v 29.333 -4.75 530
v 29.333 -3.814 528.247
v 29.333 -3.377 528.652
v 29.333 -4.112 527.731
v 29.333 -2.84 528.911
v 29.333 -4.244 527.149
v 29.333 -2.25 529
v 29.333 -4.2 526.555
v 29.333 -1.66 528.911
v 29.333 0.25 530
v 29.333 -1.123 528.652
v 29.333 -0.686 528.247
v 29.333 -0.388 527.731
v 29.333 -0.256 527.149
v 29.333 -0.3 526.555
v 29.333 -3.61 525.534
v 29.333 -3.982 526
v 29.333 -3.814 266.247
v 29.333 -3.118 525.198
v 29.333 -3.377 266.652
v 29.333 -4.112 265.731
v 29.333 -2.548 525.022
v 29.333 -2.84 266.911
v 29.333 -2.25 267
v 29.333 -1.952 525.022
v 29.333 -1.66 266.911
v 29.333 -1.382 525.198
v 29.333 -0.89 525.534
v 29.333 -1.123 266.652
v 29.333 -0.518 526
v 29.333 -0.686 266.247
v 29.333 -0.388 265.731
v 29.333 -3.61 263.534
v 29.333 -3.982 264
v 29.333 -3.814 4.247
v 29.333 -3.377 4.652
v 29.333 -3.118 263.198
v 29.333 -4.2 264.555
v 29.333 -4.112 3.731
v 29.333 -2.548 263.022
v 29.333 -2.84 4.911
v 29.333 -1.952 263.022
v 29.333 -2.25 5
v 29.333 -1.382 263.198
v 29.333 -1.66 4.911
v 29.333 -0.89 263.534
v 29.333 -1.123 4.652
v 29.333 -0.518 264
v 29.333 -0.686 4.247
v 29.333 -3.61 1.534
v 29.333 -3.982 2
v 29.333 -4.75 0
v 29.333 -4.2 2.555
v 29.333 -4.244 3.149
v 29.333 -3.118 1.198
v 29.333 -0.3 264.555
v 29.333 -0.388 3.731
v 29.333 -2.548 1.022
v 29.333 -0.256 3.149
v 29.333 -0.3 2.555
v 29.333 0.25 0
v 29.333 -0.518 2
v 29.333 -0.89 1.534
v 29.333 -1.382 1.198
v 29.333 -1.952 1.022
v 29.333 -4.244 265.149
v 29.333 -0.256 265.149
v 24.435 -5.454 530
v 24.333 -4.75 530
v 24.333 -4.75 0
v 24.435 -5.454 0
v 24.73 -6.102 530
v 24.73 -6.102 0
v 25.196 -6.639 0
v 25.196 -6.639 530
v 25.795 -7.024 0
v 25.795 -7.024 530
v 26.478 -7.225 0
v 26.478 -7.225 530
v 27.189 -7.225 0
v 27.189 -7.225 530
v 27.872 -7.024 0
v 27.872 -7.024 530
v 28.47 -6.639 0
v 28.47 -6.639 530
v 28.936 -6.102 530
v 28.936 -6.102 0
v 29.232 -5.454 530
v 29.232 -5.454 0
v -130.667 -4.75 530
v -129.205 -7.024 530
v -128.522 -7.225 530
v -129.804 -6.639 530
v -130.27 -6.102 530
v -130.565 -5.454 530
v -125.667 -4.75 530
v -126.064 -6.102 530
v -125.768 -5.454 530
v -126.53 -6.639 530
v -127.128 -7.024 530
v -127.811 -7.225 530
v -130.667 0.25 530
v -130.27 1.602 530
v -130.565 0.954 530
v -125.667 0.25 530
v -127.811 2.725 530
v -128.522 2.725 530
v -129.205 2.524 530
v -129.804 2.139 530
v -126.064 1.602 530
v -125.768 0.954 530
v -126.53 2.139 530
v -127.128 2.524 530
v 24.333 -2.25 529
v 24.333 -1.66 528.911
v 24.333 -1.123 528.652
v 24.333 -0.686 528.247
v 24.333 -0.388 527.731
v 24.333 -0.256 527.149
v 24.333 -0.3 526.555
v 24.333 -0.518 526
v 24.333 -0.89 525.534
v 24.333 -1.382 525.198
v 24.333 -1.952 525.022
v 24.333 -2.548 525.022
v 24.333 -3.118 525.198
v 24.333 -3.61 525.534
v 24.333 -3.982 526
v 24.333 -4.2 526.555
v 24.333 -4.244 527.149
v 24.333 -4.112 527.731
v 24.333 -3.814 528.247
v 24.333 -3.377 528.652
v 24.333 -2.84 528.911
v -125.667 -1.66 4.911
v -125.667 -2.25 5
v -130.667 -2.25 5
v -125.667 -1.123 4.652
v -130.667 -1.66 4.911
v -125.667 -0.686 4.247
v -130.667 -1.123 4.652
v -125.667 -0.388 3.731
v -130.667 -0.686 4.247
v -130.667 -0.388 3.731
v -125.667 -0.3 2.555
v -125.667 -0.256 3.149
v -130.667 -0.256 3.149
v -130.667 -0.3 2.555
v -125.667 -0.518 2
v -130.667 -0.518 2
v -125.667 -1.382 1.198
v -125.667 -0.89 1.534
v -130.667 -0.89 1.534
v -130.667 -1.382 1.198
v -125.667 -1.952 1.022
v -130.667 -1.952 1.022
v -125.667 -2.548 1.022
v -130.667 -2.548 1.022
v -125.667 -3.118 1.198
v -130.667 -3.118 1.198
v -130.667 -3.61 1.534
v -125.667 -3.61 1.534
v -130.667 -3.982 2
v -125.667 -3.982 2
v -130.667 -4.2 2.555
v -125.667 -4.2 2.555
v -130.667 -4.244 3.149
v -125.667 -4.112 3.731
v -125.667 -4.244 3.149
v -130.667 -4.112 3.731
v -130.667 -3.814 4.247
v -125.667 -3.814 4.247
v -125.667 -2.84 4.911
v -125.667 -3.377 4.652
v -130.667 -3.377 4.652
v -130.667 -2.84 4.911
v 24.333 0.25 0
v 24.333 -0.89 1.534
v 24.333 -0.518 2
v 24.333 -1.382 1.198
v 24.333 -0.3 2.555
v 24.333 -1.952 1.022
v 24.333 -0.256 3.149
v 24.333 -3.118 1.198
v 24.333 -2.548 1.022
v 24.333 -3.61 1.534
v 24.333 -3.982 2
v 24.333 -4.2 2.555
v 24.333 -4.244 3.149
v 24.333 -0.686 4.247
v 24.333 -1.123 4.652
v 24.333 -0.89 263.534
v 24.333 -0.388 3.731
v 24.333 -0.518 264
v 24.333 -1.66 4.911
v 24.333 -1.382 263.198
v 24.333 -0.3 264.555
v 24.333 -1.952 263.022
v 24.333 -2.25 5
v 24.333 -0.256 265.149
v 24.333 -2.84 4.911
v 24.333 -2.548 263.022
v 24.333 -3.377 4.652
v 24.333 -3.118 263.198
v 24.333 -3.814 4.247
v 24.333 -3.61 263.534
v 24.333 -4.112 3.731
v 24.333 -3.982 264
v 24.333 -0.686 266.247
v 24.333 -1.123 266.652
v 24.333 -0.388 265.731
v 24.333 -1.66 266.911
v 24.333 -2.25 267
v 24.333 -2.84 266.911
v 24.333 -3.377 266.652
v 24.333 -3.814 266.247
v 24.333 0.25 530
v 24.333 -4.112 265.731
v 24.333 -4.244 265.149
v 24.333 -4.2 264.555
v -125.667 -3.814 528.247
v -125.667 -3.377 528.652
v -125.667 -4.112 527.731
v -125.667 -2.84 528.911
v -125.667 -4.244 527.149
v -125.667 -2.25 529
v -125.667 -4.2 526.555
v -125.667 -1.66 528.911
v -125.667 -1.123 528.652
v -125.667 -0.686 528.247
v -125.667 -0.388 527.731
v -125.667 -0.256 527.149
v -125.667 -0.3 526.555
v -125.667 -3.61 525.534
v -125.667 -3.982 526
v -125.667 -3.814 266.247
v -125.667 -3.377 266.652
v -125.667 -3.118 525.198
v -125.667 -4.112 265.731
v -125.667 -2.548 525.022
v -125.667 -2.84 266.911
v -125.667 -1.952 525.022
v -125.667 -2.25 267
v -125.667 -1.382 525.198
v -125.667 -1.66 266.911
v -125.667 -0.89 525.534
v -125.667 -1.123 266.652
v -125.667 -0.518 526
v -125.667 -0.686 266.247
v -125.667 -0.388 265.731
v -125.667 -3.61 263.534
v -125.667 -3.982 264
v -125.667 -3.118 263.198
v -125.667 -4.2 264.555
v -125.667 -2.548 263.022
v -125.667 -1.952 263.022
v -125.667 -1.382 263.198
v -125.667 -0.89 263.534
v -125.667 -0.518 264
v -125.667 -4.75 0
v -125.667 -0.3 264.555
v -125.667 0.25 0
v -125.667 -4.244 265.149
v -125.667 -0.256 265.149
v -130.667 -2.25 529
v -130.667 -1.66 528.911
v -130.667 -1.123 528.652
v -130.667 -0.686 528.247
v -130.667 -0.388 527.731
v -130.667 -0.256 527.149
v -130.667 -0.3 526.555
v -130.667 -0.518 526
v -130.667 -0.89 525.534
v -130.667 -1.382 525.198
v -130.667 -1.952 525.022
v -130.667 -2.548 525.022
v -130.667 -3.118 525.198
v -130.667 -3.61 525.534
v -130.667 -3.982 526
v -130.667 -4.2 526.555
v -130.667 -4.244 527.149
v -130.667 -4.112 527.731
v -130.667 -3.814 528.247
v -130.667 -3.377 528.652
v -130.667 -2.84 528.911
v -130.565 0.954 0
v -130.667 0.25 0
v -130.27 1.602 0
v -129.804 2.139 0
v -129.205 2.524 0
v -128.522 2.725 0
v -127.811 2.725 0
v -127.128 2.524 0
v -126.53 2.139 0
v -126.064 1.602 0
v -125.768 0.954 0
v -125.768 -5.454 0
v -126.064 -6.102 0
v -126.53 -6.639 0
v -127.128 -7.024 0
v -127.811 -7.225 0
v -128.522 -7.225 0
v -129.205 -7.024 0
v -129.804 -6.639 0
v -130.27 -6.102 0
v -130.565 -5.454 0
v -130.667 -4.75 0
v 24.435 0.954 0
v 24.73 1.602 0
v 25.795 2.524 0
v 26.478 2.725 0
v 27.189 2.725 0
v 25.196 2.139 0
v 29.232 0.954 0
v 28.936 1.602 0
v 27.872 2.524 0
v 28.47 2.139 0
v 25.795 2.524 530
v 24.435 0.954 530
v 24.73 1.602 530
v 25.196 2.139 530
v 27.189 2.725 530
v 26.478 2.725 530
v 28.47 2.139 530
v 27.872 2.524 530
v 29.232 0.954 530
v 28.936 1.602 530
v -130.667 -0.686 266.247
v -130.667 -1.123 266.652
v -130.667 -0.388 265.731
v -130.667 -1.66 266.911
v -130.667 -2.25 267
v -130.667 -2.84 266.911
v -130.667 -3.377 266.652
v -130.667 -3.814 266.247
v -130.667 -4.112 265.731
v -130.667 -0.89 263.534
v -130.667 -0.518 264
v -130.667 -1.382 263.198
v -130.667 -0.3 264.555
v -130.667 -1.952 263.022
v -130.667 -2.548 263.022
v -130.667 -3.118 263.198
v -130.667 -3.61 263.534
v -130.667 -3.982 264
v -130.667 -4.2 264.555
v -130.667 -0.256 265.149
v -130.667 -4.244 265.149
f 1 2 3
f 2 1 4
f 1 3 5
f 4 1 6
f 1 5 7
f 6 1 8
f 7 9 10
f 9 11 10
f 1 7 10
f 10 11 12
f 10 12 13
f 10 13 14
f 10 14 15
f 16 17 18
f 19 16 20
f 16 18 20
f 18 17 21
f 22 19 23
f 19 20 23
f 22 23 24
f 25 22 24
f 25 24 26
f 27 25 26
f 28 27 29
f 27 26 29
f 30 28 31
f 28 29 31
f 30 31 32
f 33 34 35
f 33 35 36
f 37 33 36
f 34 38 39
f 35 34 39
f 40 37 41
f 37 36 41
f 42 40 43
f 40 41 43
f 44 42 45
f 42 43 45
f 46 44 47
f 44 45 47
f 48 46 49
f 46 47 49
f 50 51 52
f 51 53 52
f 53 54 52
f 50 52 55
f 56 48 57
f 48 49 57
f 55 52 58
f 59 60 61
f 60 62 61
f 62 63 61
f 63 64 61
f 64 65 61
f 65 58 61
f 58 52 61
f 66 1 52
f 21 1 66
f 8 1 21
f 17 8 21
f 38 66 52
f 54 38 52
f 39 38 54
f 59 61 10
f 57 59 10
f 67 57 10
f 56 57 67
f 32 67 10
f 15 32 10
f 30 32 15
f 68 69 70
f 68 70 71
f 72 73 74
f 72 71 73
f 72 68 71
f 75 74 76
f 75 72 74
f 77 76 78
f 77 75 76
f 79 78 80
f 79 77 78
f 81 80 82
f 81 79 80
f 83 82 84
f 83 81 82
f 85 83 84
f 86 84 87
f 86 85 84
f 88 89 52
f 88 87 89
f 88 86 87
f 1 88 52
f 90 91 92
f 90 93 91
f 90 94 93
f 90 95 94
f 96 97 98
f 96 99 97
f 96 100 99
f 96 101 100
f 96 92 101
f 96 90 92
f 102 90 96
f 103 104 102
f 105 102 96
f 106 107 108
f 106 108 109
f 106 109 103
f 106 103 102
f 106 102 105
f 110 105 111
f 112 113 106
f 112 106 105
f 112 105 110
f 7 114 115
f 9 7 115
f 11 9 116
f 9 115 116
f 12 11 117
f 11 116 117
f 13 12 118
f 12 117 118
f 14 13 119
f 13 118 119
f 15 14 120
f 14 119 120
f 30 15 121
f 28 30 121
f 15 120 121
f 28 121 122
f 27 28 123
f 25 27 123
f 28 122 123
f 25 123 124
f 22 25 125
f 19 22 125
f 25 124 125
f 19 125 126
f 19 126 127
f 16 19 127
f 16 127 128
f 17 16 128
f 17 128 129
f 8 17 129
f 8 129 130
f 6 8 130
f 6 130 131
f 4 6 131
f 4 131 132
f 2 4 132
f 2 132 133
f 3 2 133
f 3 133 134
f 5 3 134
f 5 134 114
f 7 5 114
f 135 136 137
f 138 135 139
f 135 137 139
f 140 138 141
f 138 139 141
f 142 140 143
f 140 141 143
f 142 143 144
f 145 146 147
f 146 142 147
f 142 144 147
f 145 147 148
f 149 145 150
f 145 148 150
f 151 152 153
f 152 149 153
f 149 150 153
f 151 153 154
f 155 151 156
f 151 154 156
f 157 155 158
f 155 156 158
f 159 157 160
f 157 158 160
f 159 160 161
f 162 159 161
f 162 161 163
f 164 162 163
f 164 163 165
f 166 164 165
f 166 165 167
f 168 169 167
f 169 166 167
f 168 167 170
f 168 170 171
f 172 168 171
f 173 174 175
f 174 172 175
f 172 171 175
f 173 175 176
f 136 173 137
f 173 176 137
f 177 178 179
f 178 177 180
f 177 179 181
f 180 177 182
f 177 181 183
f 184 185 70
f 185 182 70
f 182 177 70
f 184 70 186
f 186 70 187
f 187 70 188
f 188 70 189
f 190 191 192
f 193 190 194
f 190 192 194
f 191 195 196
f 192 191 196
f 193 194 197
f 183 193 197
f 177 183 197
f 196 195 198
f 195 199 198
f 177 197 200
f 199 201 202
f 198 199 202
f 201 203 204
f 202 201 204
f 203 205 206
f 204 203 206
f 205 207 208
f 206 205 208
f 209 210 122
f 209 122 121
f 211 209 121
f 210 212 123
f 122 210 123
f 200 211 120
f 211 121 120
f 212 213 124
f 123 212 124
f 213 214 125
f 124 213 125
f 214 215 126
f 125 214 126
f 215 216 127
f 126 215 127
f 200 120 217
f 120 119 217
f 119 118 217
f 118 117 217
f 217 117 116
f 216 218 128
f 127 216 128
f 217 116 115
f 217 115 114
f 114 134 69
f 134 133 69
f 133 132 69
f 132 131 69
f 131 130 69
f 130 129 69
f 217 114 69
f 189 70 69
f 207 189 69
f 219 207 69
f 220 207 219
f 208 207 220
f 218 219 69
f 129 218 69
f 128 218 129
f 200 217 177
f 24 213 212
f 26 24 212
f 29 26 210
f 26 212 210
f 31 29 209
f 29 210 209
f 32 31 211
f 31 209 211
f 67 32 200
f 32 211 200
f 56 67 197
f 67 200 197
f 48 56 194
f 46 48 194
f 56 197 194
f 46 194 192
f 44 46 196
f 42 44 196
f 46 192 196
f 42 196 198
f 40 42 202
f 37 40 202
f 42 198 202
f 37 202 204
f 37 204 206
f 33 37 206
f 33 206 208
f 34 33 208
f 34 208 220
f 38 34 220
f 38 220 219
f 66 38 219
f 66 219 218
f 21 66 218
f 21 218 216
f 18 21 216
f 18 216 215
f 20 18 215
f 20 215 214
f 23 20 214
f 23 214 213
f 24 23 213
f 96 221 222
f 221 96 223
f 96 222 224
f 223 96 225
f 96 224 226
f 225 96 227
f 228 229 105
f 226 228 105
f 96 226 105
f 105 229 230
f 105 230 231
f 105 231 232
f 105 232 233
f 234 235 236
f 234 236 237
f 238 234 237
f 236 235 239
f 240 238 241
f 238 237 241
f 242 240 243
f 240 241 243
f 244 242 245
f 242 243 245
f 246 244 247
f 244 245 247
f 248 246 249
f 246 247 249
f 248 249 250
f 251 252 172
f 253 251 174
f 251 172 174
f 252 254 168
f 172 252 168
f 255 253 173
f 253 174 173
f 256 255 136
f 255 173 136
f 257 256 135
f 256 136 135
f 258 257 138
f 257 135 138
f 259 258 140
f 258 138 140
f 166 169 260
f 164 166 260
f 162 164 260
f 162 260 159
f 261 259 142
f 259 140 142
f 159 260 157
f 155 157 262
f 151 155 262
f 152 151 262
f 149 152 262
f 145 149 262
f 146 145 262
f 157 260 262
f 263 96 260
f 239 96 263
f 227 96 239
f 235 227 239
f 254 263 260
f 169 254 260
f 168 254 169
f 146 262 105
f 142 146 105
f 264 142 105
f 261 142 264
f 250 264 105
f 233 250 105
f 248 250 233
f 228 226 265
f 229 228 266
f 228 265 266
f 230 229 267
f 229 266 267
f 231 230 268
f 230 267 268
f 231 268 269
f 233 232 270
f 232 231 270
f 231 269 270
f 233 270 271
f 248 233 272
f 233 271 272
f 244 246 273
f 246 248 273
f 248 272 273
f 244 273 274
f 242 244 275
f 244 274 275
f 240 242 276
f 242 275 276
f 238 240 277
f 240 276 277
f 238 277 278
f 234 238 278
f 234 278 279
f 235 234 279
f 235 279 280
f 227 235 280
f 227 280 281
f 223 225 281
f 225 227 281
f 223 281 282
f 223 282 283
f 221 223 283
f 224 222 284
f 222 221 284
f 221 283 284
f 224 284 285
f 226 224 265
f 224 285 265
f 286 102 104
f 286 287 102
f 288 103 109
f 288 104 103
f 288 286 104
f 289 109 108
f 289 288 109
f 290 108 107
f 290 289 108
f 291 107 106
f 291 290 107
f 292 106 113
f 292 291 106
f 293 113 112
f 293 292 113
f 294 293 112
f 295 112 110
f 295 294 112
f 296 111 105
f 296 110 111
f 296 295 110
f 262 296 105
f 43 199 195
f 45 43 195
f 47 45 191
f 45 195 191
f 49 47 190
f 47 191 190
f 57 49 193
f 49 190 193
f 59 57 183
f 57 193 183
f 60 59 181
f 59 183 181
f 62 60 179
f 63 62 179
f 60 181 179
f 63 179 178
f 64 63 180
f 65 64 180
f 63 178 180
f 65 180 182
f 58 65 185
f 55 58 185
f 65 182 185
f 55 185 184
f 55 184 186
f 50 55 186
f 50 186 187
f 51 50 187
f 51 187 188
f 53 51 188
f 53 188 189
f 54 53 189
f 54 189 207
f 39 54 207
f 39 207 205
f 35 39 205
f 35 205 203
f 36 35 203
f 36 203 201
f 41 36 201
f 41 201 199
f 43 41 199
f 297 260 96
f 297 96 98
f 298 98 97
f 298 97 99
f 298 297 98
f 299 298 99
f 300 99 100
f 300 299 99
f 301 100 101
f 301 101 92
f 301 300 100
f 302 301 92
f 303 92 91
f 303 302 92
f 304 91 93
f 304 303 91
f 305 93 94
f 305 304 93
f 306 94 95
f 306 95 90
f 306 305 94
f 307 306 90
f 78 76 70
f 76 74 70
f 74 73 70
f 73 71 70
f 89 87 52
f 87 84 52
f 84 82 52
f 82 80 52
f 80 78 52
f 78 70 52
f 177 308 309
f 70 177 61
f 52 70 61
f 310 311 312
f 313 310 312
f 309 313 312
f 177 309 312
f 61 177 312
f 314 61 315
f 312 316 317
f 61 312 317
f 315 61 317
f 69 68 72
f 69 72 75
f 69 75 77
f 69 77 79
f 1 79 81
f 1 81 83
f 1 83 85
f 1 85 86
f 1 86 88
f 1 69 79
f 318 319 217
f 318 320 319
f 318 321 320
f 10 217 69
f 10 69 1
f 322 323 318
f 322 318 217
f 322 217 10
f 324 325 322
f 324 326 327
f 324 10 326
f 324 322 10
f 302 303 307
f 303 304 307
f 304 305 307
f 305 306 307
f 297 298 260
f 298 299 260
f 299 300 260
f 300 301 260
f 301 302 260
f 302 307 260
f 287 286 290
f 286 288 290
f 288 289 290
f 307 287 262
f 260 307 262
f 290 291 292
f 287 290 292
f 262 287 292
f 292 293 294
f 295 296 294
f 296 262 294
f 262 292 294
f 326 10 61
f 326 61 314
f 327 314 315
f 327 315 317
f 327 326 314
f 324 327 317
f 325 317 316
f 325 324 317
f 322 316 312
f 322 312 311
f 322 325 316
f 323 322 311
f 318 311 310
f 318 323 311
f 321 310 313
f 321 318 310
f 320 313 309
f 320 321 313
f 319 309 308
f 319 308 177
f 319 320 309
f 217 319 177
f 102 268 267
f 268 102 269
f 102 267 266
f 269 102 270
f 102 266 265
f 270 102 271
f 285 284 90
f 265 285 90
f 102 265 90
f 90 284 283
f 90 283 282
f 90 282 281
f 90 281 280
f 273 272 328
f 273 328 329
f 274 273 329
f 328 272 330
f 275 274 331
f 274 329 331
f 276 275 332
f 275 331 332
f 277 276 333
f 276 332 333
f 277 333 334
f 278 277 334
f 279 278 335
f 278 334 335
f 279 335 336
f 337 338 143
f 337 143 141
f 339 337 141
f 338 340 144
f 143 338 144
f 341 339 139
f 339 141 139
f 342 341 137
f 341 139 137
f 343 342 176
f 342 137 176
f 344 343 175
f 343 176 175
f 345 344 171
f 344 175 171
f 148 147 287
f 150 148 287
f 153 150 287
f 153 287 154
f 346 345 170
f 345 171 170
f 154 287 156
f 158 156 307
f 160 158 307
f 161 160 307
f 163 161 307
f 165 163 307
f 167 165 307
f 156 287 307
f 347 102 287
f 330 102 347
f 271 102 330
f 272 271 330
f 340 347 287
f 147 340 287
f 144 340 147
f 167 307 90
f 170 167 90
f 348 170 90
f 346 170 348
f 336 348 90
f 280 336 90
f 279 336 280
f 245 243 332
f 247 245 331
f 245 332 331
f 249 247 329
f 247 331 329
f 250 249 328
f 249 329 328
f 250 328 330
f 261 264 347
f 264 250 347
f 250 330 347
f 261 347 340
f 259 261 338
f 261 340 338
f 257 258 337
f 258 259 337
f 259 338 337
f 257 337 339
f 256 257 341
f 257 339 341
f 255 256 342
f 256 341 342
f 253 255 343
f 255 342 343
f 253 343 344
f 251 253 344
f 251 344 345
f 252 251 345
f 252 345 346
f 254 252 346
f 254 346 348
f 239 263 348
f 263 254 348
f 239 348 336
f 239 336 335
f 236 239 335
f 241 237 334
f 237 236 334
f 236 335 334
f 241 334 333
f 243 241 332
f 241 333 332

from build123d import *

# Parameters (mm, degrees)
BOSS_EXTRUDE1_DEPTH   = 530
F_4_0MM_DOWEL_HOLE1_D = 4
SKETCH5_W             = 150
SKETCH5_H             = 85.013132282
CUT_EXTRUDE1_DEPTH    = 10
SKETCH6_W             = 150
SKETCH6_H             = 150
CUT_EXTRUDE2_DEPTH    = 546.892643088
SKETCH7_W             = 150
SKETCH7_H             = 27.986867718
BOSS_EXTRUDE2_DEPTH   = 2
SKETCH8_W             = 150
SKETCH8_H             = 388.643784195
CUT_EXTRUDE3_DEPTH    = 546.961333592
FILLET1_RADIUS        = 2.5
FILLET1_LENGTH        = 530
FILLET2_RADIUS        = 2.5
FILLET2_LENGTH        = 530
FILLET3_RADIUS        = 2.5
FILLET3_LENGTH        = 530
FILLET4_RADIUS        = 2.5
FILLET4_LENGTH        = 530


with BuildPart() as part:
    # Sketch1 → Boss-Extrude1 (new body)
    with BuildSketch(Plane.XY):
        Polygon((-130.666666667, 2.75), (-130.666666667, -7.25), (29.333333333, -7.25), (29.333333333, 2.75), (24.333333333, 2.75), (24.333333333, -2.25), (-125.666666667, -2.25), (-125.666666667, 2.75), align=None)
    extrude(amount=BOSS_EXTRUDE1_DEPTH)

    # Ø4.0mm Dowel Hole1 (through all)
    with Locations(Plane(origin=(29.333333333, 0, 0), x_dir=(0, 0, -1), z_dir=(1, 0, 0))):
        with Locations((-527, -2.25), (-265, -2.25), (-3, -2.25)):
            Hole(F_4_0MM_DOWEL_HOLE1_D / 2)

    # Sketch5 → Cut-Extrude1 (cut)
    with BuildSketch(Plane(origin=(0, -2.25, 0), x_dir=(1, 0, 0), z_dir=(0, 1, 0))):
        with Locations((-50.666666667, -42.506566141)):
            Rectangle(SKETCH5_W, SKETCH5_H)
    extrude(amount=-CUT_EXTRUDE1_DEPTH, mode=Mode.SUBTRACT)

    # Sketch6 → Cut-Extrude2 (cut, through all)
    with BuildSketch(Plane(origin=(0, -2.25, 0), x_dir=(1, 0, 0), z_dir=(0, 1, 0))):
        with Locations((-50.666666667, -160.013132282)):
            Rectangle(SKETCH6_W, SKETCH6_H)
    extrude(amount=-CUT_EXTRUDE2_DEPTH, mode=Mode.SUBTRACT)

    # Sketch7 → Boss-Extrude2 (add)
    with BuildSketch(Plane(origin=(0, 2.75, 0), x_dir=(1, 0, 0), z_dir=(0, 1, 0))):
        with Locations((-50.666666667, -249.006566141)):
            Rectangle(SKETCH7_W, SKETCH7_H)
    extrude(amount=-BOSS_EXTRUDE2_DEPTH)

    # Sketch8 → Cut-Extrude3 (cut, through all)
    with BuildSketch(Plane.XZ.offset(7.25)):
        with Locations((-50.666666667, 429.33502438)):
            Rectangle(SKETCH8_W, SKETCH8_H)
    extrude(amount=-CUT_EXTRUDE3_DEPTH, mode=Mode.SUBTRACT)


with BuildPart() as cut_extrude3_piece_1:
    # of the separate pieces the step leaves, piece 1, a body of its own (cut_extrude3_pieces)
    add(part.part.solids().sort_by_distance((29.333333333, 2.75, 530))[0])

    # Fillet1: full round fillet: the end face becomes a half cylinder, R = half its width
    fillet1_face = Plane((26.833333333, -7.25, 265), x_dir=(0, 0, 1), z_dir=(0, -1, 0))  # on the end face: x along it, z out of the body
    fillet1_slab = fillet1_face.offset(-FILLET1_RADIUS / 2) * Box(FILLET1_LENGTH, 2 * FILLET1_RADIUS, FILLET1_RADIUS, mode=Mode.PRIVATE)  # the body's end, R deep
    fillet1_round = Plane((26.833333333, -4.75, 265), x_dir=(0, -1, 0), z_dir=(0, 0, 1)) * Cylinder(FILLET1_RADIUS, FILLET1_LENGTH, mode=Mode.PRIVATE)  # its axis R under the face
    add(fillet1_slab - fillet1_round, mode=Mode.SUBTRACT)

    # Fillet2: full round fillet: the end face becomes a half cylinder, R = half its width
    fillet2_face = Plane((26.833333333, 2.75, 265), x_dir=(0, 0, 1), z_dir=(0, 1, 0))  # on the end face: x along it, z out of the body
    fillet2_slab = fillet2_face.offset(-FILLET2_RADIUS / 2) * Box(FILLET2_LENGTH, 2 * FILLET2_RADIUS, FILLET2_RADIUS, mode=Mode.PRIVATE)  # the body's end, R deep
    fillet2_round = Plane((26.833333333, 0.25, 265), x_dir=(0, 1, 0), z_dir=(0, 0, 1)) * Cylinder(FILLET2_RADIUS, FILLET2_LENGTH, mode=Mode.PRIVATE)  # its axis R under the face
    add(fillet2_slab - fillet2_round, mode=Mode.SUBTRACT)


with BuildPart() as cut_extrude3_piece_2:
    # of the separate pieces the step leaves, piece 2, a body of its own (cut_extrude3_pieces)
    add(part.part.solids().sort_by_distance((-130.666666667, 2.75, 0))[0])

    # Fillet3: full round fillet: the end face becomes a half cylinder, R = half its width
    fillet3_face = Plane((-128.166666667, -7.25, 265), x_dir=(0, 0, -1), z_dir=(0, -1, 0))  # on the end face: x along it, z out of the body
    fillet3_slab = fillet3_face.offset(-FILLET3_RADIUS / 2) * Box(FILLET3_LENGTH, 2 * FILLET3_RADIUS, FILLET3_RADIUS, mode=Mode.PRIVATE)  # the body's end, R deep
    fillet3_round = Plane((-128.166666667, -4.75, 265), x_dir=(0, -1, 0), z_dir=(0, 0, -1)) * Cylinder(FILLET3_RADIUS, FILLET3_LENGTH, mode=Mode.PRIVATE)  # its axis R under the face
    add(fillet3_slab - fillet3_round, mode=Mode.SUBTRACT)

    # Fillet4: full round fillet: the end face becomes a half cylinder, R = half its width
    fillet4_face = Plane((-128.166666667, 2.75, 265), x_dir=(0, 0, -1), z_dir=(0, 1, 0))  # on the end face: x along it, z out of the body
    fillet4_slab = fillet4_face.offset(-FILLET4_RADIUS / 2) * Box(FILLET4_LENGTH, 2 * FILLET4_RADIUS, FILLET4_RADIUS, mode=Mode.PRIVATE)  # the body's end, R deep
    fillet4_round = Plane((-128.166666667, 0.25, 265), x_dir=(0, 1, 0), z_dir=(0, 0, -1)) * Cylinder(FILLET4_RADIUS, FILLET4_LENGTH, mode=Mode.PRIVATE)  # its axis R under the face
    add(fillet4_slab - fillet4_round, mode=Mode.SUBTRACT)


solid = Compound([cut_extrude3_piece_1.part, cut_extrude3_piece_2.part])
